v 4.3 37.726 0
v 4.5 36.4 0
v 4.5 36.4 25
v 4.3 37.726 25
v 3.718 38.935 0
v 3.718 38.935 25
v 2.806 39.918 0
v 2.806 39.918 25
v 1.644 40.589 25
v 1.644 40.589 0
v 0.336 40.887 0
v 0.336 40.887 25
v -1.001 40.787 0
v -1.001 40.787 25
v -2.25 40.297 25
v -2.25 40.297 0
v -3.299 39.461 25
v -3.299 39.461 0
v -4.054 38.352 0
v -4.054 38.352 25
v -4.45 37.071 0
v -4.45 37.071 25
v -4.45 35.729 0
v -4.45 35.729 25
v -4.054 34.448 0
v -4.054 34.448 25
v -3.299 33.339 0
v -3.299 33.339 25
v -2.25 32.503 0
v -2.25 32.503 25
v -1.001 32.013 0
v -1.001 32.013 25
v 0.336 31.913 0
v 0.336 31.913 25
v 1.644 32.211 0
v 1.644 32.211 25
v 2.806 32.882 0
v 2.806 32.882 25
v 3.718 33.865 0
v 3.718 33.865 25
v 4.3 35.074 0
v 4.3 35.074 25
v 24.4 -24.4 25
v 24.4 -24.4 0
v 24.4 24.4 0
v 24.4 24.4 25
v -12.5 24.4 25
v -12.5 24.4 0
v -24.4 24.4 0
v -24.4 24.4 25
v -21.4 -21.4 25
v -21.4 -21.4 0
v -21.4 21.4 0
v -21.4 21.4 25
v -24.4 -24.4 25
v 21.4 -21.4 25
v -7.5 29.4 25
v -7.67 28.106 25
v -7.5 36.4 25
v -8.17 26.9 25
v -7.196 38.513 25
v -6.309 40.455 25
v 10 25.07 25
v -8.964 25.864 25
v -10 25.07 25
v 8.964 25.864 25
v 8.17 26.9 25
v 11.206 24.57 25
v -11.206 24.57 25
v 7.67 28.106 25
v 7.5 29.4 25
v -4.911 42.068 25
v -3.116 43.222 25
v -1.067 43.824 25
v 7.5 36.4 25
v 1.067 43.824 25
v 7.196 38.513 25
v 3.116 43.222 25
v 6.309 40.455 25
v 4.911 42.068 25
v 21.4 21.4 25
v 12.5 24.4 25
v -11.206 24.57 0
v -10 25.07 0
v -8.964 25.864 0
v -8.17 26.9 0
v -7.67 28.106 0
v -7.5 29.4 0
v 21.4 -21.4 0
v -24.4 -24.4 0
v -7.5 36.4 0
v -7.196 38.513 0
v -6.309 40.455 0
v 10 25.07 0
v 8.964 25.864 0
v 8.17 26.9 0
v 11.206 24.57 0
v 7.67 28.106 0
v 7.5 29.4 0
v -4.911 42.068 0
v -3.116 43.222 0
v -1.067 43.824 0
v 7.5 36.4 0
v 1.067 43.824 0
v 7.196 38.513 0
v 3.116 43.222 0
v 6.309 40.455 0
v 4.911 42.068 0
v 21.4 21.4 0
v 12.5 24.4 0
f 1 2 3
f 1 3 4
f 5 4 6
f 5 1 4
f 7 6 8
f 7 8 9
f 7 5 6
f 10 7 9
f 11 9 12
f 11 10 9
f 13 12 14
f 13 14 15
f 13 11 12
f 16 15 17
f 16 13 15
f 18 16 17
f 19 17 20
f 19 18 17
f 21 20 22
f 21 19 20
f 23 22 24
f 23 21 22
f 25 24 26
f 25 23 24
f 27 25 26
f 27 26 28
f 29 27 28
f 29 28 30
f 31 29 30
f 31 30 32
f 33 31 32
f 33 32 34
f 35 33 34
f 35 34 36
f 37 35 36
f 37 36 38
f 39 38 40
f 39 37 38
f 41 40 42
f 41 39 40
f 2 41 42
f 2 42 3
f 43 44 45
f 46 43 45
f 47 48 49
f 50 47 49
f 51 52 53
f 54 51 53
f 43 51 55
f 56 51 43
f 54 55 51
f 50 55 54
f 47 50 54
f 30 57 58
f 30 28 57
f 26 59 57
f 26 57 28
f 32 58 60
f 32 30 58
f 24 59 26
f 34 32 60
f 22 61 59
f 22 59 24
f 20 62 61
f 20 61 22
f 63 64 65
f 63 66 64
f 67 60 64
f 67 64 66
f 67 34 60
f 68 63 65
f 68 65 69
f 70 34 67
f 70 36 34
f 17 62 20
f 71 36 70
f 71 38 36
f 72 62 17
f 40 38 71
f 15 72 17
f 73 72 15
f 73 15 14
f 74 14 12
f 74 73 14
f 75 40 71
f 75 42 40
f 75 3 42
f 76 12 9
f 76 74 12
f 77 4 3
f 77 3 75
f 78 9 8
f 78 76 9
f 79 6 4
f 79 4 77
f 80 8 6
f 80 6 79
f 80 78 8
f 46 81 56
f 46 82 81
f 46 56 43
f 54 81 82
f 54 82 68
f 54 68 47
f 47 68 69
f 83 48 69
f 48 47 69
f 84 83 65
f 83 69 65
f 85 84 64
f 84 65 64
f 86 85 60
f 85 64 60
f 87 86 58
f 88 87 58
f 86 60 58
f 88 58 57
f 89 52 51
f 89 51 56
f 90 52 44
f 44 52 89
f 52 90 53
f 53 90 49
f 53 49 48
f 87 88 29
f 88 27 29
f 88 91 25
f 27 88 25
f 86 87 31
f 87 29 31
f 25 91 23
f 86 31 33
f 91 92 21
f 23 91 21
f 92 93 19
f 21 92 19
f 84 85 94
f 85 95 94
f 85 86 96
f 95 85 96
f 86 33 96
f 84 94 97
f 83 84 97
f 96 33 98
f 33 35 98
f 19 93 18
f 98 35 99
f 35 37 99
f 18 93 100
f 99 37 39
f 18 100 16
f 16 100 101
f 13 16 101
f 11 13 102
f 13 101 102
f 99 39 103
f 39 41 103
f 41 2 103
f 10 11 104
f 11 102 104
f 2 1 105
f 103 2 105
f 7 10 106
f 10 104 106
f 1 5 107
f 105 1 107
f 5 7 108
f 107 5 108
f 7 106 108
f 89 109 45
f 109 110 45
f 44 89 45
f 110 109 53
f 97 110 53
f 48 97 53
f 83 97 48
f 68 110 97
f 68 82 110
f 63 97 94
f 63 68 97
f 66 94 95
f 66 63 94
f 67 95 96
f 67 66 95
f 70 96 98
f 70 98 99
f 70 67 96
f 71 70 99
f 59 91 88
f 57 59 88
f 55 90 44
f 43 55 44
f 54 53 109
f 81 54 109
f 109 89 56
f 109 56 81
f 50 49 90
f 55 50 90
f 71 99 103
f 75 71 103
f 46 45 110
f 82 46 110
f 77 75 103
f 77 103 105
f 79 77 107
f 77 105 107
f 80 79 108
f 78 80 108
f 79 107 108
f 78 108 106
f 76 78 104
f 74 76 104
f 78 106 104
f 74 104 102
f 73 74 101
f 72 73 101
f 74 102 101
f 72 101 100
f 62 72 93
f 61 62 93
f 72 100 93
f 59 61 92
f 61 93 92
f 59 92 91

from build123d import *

# Parameters (mm, degrees)
F0_W     = 42.8
F0_H     = 42.8
F0_R     = 4.5
F1_DEPTH = 25
F2_R     = 5


with BuildPart() as f1:
    # F0 (on Top) → F1 (new body)
    with BuildSketch(Plane.XY):
        Polygon((24.4, -24.4), (24.4, 24.4), (7.5, 24.4), (-7.5, 24.4), (-24.4, 24.4), (-24.4, -24.4), align=None)
        Rectangle(F0_W, F0_H, mode=Mode.SUBTRACT)
        with BuildLine():
            Line((-7.5, 24.4), (7.5, 24.4))
            Line((7.5, 24.4), (7.5, 36.4))
            ThreePointArc((7.5, 36.4), (0, 28.9), (-7.5, 36.4))
            Line((-7.5, 36.4), (-7.5, 24.4))
        make_face()
        with BuildLine():
            ThreePointArc((-7.5, 36.4), (0, 28.9), (7.5, 36.4))
            ThreePointArc((7.5, 36.4), (0, 43.9), (-7.5, 36.4))
        make_face()
        with Locations((0, 36.4)):
            Circle(F0_R, mode=Mode.SUBTRACT)
    extrude(amount=F1_DEPTH)

    # F2
    f2_edges = [f1.edges().sort_by_distance(p)[0] for p in [
        (7.5, 24.4, 12.5),
        (-7.5, 24.4, 12.5),
    ]]
    fillet(f2_edges, radius=F2_R)


solid = f1.part
